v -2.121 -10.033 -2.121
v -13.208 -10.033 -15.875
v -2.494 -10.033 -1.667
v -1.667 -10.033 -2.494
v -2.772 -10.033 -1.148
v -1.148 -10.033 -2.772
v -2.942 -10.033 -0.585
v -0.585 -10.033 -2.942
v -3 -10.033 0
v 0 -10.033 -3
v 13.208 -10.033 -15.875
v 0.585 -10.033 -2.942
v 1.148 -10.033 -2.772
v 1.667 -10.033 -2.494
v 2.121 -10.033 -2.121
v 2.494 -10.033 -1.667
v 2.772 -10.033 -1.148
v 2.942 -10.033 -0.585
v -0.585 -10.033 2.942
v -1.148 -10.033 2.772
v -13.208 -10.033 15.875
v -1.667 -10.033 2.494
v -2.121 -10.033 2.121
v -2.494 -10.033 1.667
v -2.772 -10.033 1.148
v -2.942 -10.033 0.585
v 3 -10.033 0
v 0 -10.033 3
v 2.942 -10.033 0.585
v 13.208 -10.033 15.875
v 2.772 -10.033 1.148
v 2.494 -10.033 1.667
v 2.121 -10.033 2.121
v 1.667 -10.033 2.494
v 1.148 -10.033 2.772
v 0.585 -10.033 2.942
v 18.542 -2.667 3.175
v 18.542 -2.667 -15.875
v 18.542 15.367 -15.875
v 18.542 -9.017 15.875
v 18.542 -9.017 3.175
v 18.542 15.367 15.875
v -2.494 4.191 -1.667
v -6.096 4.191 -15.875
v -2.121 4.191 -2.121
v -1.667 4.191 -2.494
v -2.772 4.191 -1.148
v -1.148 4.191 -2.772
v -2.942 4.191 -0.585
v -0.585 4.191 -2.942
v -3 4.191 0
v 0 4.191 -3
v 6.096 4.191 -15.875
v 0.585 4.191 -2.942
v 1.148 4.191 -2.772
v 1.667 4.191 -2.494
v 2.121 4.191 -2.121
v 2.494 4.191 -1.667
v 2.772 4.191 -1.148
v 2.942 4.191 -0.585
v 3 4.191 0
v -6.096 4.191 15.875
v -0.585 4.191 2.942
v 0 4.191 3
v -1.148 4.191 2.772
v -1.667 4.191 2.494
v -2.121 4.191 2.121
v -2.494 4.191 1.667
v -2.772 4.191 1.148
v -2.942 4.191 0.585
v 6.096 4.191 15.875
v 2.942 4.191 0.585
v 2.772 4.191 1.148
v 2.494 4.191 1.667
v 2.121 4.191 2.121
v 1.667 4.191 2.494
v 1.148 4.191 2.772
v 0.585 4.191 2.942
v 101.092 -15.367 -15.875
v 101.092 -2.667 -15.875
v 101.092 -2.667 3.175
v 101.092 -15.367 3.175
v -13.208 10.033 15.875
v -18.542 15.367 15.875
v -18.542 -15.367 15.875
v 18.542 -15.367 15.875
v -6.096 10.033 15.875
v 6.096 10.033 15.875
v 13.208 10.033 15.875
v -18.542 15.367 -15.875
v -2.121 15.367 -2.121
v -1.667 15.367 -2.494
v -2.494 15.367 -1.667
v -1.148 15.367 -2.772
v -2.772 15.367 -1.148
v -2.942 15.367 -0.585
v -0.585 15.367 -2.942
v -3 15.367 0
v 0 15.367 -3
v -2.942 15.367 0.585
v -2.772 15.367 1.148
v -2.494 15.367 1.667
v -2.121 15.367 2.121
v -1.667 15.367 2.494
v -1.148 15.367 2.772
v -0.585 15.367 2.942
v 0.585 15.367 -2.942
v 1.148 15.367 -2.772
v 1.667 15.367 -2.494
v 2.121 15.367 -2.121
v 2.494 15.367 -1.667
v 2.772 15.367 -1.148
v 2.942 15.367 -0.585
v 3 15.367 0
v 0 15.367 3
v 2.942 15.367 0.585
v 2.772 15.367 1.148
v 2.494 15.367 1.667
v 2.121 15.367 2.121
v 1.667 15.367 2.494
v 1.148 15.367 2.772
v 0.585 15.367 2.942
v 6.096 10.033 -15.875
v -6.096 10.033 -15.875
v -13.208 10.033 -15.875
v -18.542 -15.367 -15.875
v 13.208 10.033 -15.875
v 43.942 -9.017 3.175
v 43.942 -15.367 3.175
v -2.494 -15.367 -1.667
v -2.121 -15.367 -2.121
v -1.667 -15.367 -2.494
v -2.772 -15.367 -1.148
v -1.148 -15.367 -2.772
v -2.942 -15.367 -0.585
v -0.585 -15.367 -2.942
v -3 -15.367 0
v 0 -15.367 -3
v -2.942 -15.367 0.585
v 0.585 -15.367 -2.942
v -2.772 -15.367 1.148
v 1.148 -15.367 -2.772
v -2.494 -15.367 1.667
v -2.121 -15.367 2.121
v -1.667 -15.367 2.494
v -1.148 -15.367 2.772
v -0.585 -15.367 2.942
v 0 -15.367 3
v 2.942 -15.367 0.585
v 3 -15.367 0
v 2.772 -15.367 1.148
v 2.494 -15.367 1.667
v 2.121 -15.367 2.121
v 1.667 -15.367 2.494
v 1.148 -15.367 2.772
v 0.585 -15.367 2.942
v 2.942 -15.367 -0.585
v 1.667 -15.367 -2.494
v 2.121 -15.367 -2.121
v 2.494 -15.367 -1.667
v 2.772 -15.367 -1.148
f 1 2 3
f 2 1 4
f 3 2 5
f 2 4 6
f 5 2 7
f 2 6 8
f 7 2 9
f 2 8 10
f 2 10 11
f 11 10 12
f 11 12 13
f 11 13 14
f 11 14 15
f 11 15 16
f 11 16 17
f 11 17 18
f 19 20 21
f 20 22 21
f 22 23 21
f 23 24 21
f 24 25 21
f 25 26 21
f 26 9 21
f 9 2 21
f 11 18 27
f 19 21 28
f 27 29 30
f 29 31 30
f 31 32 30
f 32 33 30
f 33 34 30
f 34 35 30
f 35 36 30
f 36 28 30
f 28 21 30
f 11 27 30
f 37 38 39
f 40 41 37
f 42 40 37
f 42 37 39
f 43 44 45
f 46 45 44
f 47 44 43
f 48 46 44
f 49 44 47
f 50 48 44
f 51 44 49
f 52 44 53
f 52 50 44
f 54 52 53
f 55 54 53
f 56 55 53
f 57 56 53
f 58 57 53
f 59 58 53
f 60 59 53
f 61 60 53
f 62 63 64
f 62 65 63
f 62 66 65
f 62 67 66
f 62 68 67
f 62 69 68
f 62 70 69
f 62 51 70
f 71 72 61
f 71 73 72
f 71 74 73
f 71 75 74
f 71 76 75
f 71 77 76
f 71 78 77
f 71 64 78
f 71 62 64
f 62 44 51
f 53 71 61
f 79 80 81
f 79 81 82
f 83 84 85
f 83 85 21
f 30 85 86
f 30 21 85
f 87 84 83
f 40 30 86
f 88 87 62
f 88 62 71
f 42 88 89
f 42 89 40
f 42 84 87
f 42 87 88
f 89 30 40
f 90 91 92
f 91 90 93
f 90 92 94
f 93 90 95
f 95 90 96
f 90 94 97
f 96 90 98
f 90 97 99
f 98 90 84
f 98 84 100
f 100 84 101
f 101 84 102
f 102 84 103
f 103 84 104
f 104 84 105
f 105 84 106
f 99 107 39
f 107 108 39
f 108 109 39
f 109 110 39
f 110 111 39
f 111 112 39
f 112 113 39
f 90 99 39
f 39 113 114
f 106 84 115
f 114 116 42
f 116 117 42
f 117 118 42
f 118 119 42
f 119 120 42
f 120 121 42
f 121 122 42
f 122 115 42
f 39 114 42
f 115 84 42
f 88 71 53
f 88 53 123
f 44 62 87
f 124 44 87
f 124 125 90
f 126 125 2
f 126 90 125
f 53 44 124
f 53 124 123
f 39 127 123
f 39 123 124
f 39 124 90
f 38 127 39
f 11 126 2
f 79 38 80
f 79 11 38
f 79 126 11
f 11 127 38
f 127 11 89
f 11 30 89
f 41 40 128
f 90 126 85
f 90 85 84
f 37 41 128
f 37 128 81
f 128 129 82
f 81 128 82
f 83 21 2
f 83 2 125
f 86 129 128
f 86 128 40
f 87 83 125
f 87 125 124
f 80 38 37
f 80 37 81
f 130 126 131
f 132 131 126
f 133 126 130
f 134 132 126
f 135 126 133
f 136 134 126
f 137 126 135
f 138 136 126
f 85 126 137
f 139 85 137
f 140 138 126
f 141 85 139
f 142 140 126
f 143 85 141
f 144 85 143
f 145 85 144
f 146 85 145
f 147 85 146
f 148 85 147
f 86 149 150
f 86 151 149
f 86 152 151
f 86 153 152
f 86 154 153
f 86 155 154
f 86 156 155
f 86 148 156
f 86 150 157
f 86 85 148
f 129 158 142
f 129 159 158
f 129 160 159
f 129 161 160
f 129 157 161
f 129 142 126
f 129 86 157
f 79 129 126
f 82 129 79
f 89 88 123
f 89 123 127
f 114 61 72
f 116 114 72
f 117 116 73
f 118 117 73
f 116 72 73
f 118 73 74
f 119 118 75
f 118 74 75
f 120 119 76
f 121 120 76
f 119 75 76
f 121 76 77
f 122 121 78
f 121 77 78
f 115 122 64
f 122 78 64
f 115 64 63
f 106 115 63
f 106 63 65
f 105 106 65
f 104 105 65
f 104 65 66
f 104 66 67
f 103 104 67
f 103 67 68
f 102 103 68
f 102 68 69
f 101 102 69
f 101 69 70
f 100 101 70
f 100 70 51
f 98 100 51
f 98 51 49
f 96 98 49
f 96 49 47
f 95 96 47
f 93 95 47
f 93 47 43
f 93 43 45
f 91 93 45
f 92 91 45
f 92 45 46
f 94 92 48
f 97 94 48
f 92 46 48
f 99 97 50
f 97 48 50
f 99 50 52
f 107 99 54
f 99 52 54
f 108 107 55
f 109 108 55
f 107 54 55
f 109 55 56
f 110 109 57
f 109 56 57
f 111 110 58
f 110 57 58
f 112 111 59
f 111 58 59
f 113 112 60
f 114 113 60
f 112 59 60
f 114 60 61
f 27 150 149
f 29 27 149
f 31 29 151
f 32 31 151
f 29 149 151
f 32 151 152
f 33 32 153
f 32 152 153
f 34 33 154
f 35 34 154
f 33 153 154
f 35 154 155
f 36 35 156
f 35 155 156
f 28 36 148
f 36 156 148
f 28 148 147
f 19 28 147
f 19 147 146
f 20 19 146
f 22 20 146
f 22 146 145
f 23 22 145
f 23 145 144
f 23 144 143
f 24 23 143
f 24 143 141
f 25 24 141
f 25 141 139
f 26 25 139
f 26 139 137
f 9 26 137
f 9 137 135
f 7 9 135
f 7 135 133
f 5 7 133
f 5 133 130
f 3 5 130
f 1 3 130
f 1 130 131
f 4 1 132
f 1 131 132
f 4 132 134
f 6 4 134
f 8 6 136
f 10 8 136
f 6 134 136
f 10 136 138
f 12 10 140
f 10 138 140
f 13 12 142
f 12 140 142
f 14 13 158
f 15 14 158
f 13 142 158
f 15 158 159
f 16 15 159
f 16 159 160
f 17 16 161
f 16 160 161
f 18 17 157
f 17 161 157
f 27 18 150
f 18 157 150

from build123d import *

# Parameters (mm, degrees)
F0_W      = 37.084
F0_H      = 30.734
F0_W_2    = 26.416
F0_H_2    = 20.066
F1_DEPTH  = 15.875
F2_W      = 12.192
F2_H      = 5.842
F3_DEPTH  = 31.75
F4_W      = 82.55
F4_H      = 12.7
F5_DEPTH  = 19.05
F7_DEPTH  = 6.35
F9_R      = 3
F10_DEPTH = 30.735


with BuildPart() as f1:
    # F0 (on Top) → F1 (new body, symmetric)
    with BuildSketch(Plane.XY):
        Rectangle(F0_W, F0_H)
        Rectangle(F0_W_2, F0_H_2, mode=Mode.SUBTRACT)
    extrude(amount=F1_DEPTH, both=True)

    # F2 (on face) → F3 (join)
    with BuildSketch(Plane.XY.offset(15.875)):
        with Locations((0, 7.112)):
            Rectangle(F2_W, F2_H)
    extrude(amount=-F3_DEPTH)

    # F4 (on face) → F5 (join)
    with BuildSketch(Plane(origin=(0, 0, -15.875), x_dir=(1, 0, 0), z_dir=(0, 0, -1))):
        with Locations((59.817, 9.017)):
            Rectangle(F4_W, F4_H)
    extrude(amount=-F5_DEPTH)

    # F6 (on face) → F7 (join)
    with BuildSketch(Plane.XZ.offset(15.367)):
        Polygon((43.942, 3.175), (18.542, 15.875), (18.542, 3.175), align=None)
    extrude(amount=-F7_DEPTH)

    # F9 (on face) → F10 (cut, through all)
    with BuildSketch(Plane.XZ.offset(15.367)):
        Circle(F9_R)
    extrude(amount=-F10_DEPTH, mode=Mode.SUBTRACT)


solid = f1.part
